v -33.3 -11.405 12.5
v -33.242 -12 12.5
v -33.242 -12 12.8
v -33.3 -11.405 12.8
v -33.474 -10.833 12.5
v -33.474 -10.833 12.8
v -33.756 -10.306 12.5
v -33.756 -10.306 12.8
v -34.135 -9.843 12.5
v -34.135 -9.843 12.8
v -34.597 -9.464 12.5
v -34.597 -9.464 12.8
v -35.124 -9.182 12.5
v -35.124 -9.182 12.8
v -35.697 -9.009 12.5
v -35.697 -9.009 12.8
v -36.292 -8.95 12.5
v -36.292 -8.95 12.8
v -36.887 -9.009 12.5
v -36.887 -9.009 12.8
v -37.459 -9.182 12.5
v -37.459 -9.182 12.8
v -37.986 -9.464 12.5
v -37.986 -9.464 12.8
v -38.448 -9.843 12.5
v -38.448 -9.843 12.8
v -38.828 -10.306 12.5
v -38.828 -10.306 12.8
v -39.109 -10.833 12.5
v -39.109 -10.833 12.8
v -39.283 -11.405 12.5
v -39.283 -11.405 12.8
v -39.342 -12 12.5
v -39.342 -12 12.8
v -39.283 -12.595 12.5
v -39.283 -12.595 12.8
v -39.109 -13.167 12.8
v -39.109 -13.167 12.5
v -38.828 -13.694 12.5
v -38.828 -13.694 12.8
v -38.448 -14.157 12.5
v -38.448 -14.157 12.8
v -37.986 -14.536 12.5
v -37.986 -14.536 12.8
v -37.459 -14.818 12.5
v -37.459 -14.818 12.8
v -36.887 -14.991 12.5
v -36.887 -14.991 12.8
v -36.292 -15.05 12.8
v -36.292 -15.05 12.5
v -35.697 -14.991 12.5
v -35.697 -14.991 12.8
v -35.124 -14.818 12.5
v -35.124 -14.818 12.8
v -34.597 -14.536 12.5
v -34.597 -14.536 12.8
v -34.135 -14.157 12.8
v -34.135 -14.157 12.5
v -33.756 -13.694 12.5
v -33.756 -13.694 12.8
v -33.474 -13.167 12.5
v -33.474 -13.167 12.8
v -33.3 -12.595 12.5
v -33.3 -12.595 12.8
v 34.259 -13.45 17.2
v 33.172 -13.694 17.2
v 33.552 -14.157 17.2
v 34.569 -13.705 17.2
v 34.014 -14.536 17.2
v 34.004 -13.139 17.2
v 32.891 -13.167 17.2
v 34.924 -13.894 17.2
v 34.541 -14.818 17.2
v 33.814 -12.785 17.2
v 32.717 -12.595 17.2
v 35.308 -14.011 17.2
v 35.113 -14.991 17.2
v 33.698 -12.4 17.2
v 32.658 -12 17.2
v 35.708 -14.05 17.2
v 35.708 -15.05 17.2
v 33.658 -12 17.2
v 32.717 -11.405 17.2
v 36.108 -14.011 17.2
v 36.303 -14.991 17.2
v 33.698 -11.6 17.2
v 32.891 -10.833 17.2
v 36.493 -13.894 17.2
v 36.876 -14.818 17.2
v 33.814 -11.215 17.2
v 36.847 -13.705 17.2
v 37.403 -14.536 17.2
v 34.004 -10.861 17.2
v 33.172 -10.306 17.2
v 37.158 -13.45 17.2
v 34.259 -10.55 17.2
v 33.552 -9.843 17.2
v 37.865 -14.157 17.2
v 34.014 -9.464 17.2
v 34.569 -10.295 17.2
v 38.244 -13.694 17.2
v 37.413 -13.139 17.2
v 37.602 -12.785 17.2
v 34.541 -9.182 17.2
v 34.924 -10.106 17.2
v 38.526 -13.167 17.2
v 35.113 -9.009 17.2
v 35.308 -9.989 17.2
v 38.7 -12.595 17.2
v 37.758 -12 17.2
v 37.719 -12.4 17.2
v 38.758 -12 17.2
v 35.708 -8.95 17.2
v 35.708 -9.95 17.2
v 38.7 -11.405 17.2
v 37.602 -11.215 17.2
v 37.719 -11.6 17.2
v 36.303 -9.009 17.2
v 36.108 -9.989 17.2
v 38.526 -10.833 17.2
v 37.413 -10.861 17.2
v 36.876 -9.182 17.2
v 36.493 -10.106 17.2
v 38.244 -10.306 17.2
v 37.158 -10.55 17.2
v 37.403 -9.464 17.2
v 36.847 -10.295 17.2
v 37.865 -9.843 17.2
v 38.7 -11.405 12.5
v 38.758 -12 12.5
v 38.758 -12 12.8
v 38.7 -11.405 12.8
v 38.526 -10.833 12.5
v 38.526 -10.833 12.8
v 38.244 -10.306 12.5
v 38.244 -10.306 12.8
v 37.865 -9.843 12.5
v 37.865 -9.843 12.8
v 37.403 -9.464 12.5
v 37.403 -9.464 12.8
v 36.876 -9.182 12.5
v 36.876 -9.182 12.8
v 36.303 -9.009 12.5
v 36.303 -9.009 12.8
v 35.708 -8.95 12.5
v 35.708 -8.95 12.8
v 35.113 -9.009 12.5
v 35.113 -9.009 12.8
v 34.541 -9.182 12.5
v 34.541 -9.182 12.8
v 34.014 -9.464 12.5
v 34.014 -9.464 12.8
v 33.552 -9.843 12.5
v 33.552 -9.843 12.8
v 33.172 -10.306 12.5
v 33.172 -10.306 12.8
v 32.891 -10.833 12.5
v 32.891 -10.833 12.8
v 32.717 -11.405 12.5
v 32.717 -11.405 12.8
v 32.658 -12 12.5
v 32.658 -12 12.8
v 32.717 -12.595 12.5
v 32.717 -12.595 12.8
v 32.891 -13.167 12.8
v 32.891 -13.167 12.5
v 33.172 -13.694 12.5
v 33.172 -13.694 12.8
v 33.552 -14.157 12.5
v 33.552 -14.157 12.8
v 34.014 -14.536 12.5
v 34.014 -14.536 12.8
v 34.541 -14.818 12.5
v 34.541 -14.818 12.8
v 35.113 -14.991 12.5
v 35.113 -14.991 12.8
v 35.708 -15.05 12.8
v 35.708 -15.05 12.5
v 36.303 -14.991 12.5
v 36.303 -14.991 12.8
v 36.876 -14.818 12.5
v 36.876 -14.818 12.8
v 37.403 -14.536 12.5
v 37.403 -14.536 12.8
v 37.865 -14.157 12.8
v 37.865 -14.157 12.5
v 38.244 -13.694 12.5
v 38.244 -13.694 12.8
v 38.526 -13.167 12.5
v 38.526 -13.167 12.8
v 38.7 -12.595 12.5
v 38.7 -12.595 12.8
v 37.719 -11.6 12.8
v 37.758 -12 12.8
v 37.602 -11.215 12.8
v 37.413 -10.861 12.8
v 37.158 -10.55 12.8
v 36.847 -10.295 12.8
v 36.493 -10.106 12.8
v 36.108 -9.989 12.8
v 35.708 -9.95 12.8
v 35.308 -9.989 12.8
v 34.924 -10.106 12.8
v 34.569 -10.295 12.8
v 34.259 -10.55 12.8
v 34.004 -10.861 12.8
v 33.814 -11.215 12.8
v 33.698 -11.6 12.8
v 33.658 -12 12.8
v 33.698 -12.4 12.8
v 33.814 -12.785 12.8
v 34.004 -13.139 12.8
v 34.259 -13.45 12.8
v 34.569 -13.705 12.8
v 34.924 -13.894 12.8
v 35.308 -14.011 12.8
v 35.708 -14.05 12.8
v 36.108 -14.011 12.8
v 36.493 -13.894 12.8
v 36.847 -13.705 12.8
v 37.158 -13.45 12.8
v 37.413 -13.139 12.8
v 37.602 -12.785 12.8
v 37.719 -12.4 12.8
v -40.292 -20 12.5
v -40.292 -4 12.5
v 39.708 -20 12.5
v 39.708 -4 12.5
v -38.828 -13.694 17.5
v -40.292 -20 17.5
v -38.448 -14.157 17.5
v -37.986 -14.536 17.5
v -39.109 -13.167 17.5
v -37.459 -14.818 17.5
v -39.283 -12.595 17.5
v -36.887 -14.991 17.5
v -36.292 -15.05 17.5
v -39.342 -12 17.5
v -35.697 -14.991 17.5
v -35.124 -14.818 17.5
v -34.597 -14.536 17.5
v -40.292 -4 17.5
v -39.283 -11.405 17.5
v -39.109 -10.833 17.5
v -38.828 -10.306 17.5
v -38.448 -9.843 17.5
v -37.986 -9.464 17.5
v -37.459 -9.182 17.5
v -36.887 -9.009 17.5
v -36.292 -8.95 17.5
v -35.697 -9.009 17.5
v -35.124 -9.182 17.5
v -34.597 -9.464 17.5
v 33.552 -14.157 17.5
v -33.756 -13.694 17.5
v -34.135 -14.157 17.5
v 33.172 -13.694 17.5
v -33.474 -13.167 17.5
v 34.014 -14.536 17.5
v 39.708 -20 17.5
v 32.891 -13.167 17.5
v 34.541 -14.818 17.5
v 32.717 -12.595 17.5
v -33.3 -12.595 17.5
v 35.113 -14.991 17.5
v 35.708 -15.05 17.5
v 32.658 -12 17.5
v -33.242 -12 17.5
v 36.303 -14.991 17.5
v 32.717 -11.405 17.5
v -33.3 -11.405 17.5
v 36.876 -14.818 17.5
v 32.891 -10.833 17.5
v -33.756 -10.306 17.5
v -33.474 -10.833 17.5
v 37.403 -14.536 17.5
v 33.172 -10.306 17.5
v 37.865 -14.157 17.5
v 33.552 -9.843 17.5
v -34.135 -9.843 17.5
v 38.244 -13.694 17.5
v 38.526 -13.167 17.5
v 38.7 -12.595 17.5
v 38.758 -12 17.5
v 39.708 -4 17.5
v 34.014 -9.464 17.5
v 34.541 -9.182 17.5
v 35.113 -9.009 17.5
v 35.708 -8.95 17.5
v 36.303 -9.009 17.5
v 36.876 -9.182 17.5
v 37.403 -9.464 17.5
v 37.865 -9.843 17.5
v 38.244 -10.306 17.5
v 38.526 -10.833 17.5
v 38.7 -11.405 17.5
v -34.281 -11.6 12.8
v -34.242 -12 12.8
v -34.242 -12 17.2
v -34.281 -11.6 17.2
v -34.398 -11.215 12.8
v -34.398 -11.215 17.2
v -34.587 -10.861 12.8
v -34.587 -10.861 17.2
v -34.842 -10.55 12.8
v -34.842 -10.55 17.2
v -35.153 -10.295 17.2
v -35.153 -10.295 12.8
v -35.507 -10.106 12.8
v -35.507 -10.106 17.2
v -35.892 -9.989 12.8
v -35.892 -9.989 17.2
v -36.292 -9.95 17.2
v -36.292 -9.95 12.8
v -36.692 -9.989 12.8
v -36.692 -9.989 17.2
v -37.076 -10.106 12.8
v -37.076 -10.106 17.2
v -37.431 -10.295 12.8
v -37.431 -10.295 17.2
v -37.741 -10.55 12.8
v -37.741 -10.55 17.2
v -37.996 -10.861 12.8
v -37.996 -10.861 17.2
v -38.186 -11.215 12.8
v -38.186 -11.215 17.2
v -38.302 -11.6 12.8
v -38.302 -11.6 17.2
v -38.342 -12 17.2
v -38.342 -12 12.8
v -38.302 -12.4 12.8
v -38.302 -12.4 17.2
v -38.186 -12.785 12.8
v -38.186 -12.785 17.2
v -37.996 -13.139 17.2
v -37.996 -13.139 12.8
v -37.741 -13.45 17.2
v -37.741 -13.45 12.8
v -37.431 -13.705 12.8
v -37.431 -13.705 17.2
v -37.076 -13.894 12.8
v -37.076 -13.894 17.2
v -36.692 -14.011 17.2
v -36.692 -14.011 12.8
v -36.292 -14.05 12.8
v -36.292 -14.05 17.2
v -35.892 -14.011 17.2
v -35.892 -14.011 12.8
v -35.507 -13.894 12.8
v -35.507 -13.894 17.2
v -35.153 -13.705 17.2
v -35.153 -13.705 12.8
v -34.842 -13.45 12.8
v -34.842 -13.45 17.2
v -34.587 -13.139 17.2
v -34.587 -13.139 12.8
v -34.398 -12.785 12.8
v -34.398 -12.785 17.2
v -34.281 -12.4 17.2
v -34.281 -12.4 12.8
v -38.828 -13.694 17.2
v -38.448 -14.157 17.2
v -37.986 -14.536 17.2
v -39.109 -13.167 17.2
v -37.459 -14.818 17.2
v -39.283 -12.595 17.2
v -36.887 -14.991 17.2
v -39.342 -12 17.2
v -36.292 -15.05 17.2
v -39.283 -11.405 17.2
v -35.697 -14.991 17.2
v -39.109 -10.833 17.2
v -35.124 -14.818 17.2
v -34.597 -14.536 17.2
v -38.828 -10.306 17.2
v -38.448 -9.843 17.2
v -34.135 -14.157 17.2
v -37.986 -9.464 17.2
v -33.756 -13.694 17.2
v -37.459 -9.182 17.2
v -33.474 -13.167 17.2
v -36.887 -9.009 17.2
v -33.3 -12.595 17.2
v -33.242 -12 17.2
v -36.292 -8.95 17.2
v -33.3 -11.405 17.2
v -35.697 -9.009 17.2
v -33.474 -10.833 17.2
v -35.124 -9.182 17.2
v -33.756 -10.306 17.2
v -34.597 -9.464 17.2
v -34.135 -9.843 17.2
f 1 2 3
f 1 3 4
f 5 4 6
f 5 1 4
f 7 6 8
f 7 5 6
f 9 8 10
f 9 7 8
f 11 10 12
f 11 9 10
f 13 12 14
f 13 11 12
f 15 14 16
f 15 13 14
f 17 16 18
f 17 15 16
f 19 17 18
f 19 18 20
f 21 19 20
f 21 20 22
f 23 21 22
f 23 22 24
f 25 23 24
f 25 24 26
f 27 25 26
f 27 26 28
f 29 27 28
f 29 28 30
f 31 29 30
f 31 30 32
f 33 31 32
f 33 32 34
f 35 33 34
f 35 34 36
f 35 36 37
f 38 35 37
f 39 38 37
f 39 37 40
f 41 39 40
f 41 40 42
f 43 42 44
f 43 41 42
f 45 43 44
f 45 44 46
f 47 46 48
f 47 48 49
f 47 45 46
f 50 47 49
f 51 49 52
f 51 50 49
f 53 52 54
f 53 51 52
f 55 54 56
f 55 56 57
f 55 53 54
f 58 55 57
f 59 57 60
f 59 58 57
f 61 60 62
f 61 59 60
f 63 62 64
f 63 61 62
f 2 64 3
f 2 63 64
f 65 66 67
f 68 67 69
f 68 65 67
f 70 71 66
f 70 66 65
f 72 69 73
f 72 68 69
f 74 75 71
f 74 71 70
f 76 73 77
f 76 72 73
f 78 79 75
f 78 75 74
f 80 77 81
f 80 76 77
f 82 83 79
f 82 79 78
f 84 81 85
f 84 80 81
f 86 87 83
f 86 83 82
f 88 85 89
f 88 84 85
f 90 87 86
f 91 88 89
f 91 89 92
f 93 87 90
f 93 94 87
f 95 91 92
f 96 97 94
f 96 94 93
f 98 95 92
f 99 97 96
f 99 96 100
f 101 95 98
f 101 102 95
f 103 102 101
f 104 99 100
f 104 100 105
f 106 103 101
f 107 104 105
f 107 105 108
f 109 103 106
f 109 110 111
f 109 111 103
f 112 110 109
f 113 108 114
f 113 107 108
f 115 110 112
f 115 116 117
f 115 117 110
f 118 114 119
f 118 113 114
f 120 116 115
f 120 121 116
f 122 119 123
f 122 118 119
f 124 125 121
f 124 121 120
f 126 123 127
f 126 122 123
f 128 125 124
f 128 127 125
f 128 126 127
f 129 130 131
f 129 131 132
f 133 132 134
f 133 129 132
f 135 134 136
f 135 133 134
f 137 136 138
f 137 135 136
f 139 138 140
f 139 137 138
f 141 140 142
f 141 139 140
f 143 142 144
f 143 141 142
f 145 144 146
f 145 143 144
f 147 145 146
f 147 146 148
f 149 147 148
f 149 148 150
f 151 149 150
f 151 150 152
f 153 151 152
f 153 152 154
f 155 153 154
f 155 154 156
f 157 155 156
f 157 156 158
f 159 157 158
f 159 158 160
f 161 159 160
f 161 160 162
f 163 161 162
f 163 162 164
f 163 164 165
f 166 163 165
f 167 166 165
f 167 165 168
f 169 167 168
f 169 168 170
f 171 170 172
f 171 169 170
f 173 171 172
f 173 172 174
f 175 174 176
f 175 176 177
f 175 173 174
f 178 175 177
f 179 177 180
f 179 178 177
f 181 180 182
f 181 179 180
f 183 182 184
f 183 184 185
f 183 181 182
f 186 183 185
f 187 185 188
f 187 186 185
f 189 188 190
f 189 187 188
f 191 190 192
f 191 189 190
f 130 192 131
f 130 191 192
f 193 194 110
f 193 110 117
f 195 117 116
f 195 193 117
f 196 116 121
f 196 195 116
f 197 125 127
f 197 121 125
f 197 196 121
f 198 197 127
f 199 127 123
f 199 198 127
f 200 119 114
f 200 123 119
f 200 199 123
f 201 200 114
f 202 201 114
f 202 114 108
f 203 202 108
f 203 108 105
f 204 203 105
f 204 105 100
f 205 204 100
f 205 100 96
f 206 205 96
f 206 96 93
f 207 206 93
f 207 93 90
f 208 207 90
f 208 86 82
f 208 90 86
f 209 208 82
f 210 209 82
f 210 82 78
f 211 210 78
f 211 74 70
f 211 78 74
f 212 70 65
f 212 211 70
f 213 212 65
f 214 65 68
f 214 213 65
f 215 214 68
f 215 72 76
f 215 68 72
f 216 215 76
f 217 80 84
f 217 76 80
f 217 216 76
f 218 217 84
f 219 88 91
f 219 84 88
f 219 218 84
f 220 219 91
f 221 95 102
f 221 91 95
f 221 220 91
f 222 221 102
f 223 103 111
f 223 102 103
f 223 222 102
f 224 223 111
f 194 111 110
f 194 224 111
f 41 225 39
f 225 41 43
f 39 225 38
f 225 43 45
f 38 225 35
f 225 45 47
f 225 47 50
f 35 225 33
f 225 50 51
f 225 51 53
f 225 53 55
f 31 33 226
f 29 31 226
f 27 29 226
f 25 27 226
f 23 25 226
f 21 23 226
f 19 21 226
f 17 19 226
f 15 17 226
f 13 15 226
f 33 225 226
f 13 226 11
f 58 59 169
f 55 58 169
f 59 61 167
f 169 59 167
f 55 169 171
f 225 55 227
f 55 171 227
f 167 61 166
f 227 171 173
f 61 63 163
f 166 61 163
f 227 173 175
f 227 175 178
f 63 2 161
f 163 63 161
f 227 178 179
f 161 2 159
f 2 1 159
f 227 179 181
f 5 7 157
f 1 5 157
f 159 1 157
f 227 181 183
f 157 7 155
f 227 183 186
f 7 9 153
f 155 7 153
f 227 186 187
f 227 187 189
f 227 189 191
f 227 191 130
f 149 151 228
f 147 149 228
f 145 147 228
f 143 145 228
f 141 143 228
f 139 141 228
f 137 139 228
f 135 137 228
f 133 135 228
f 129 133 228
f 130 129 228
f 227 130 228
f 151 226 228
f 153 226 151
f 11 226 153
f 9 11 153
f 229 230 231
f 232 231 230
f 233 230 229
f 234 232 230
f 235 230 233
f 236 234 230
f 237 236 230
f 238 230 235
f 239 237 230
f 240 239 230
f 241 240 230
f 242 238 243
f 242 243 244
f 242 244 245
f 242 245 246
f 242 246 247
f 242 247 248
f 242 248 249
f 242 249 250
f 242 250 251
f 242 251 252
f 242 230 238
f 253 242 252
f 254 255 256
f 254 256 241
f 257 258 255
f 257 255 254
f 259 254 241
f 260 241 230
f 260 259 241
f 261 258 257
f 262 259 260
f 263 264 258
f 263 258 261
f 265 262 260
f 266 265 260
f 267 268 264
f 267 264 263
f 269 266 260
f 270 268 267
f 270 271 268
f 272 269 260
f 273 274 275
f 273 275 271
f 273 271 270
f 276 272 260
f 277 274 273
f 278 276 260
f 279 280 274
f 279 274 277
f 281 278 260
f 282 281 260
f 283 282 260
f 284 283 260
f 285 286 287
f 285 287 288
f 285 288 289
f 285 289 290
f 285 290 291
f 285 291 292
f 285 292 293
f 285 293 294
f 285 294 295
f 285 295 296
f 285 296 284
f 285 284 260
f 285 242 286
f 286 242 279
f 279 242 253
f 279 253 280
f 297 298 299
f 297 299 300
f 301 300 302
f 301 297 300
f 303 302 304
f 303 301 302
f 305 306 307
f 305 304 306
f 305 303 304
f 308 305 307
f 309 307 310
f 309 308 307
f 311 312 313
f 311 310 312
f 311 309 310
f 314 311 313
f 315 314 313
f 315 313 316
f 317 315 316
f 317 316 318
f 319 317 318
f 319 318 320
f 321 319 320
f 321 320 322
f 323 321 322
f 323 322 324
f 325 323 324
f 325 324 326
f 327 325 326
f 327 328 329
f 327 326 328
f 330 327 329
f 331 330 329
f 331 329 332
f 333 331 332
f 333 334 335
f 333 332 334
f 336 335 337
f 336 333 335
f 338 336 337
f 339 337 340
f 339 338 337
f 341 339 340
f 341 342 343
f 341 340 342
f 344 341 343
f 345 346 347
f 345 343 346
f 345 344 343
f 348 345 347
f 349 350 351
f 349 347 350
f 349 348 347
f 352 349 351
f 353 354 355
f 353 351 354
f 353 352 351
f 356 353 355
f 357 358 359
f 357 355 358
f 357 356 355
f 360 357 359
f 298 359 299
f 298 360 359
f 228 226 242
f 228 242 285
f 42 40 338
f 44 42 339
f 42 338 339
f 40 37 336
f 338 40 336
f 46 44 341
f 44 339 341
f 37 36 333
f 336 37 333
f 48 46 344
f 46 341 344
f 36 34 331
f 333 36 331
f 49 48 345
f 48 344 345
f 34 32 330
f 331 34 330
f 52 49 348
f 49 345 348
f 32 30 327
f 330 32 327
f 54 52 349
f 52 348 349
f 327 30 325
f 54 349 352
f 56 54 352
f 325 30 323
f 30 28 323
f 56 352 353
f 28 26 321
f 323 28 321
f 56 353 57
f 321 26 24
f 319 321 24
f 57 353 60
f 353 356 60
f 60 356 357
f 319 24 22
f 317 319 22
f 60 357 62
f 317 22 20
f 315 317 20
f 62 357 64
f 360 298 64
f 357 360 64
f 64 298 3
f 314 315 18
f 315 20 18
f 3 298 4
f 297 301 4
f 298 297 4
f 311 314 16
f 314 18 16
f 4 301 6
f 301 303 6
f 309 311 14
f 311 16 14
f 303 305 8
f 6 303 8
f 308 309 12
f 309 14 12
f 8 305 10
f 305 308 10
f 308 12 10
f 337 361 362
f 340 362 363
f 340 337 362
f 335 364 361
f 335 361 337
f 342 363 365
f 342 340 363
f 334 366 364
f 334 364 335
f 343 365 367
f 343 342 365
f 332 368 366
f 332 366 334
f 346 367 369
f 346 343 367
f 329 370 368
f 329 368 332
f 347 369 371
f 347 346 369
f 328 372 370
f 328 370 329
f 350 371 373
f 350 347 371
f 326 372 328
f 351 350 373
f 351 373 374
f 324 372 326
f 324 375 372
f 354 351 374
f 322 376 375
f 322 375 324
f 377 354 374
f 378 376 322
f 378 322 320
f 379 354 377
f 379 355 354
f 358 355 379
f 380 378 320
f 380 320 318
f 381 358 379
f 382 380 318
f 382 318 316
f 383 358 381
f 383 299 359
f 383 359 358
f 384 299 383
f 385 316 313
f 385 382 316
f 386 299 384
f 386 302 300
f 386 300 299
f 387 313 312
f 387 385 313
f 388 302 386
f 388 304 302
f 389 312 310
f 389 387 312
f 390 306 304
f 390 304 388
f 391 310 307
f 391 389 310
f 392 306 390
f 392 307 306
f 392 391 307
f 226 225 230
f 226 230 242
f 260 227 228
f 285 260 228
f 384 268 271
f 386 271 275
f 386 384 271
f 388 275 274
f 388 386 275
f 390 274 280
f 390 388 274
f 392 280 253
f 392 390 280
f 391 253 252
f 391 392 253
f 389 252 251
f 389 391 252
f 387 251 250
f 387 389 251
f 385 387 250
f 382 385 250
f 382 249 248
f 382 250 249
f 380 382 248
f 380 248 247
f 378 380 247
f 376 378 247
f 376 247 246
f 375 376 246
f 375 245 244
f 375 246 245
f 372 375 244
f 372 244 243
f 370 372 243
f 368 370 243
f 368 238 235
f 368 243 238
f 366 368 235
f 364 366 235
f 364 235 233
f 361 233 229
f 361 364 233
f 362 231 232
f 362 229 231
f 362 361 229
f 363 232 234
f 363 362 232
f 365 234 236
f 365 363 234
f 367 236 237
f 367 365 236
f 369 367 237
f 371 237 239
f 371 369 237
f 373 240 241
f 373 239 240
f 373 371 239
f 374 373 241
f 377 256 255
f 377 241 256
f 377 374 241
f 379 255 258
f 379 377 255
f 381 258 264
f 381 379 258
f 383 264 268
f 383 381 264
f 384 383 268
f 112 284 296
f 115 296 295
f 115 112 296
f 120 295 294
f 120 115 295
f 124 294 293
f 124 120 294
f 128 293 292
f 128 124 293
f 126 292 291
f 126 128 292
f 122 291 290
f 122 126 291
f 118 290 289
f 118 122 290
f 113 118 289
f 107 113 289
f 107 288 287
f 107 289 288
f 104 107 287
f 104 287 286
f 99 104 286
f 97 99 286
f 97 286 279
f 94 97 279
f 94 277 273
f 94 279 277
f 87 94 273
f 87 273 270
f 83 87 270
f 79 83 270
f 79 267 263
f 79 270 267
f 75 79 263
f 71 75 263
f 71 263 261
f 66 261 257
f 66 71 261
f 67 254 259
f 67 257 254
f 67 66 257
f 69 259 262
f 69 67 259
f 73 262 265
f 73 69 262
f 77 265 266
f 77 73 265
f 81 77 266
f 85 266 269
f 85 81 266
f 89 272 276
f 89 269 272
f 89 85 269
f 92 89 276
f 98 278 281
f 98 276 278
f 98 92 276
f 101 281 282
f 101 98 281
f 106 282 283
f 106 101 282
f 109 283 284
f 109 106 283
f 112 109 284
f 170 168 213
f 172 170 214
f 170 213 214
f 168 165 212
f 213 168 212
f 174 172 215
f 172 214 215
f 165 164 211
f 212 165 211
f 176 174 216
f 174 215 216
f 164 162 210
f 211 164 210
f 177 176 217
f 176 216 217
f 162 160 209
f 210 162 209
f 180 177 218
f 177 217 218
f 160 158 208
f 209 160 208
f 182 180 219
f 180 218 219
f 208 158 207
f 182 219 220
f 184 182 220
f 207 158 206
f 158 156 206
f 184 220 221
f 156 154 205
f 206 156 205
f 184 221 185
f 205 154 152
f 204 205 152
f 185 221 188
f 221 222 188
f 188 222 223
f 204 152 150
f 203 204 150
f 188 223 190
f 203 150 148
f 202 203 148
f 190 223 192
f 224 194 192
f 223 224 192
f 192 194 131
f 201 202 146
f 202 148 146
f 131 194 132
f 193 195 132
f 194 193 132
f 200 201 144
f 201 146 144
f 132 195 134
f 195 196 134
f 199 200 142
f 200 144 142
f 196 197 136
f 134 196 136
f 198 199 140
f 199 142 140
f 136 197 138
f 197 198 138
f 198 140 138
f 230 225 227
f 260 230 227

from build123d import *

# Parameters (mm, degrees)
INSTALLED_SPRING_STRIP_SKETCH_W = 80
INSTALLED_SPRING_STRIP_SKETCH_H = 16
INSTALLED_SPRING_STRIP_DEPTH    = 5
EYELET_CLEARANCE_1_SKETCH_R     = 2.05
EYELET_CLEARANCE_1_DEPTH        = 5.2
FLANGE_RECESS_1_1_SKETCH_R      = 3.05
FLANGE_RECESS_1_1_DEPTH         = 0.4
FLANGE_RECESS_1_2_SKETCH_R      = 3.05
FLANGE_RECESS_1_2_DEPTH         = 0.4
EYELET_CLEARANCE_2_SKETCH_R     = 2.05
EYELET_CLEARANCE_2_DEPTH        = 5.2
FLANGE_RECESS_2_1_SKETCH_R      = 3.05
FLANGE_RECESS_2_1_DEPTH         = 0.4
FLANGE_RECESS_2_2_SKETCH_R      = 3.05
FLANGE_RECESS_2_2_DEPTH         = 0.4


with BuildPart() as part:
    # Installed spring strip sketch → Installed spring strip (new body)
    with BuildSketch(Plane.XY.offset(12.5)):
        with Locations((-0.291651246, -12)):
            Rectangle(INSTALLED_SPRING_STRIP_SKETCH_W, INSTALLED_SPRING_STRIP_SKETCH_H)
    extrude(amount=INSTALLED_SPRING_STRIP_DEPTH)

    # Eyelet clearance 1 sketch → Eyelet clearance 1 (cut)
    with BuildSketch(Plane.XY.offset(12.4)):
        with Locations((-36.291651246, -12)):
            Circle(EYELET_CLEARANCE_1_SKETCH_R)
    extrude(amount=EYELET_CLEARANCE_1_DEPTH, mode=Mode.SUBTRACT)

    # Flange recess 1-1 sketch → Flange recess 1-1 (cut)
    with BuildSketch(Plane.XY.offset(12.4)):
        with Locations((-36.291651246, -12)):
            Circle(FLANGE_RECESS_1_1_SKETCH_R)
    extrude(amount=FLANGE_RECESS_1_1_DEPTH, mode=Mode.SUBTRACT)

    # Flange recess 1-2 sketch → Flange recess 1-2 (cut)
    with BuildSketch(Plane.XY.offset(17.2)):
        with Locations((-36.291651246, -12)):
            Circle(FLANGE_RECESS_1_2_SKETCH_R)
    extrude(amount=FLANGE_RECESS_1_2_DEPTH, mode=Mode.SUBTRACT)

    # Eyelet clearance 2 sketch → Eyelet clearance 2 (cut)
    with BuildSketch(Plane.XY.offset(12.4)):
        with Locations((35.708348754, -12)):
            Circle(EYELET_CLEARANCE_2_SKETCH_R)
    extrude(amount=EYELET_CLEARANCE_2_DEPTH, mode=Mode.SUBTRACT)

    # Flange recess 2-1 sketch → Flange recess 2-1 (cut)
    with BuildSketch(Plane.XY.offset(12.4)):
        with Locations((35.708348754, -12)):
            Circle(FLANGE_RECESS_2_1_SKETCH_R)
    extrude(amount=FLANGE_RECESS_2_1_DEPTH, mode=Mode.SUBTRACT)

    # Flange recess 2-2 sketch → Flange recess 2-2 (cut)
    with BuildSketch(Plane.XY.offset(17.2)):
        with Locations((35.708348754, -12)):
            Circle(FLANGE_RECESS_2_2_SKETCH_R)
    extrude(amount=FLANGE_RECESS_2_2_DEPTH, mode=Mode.SUBTRACT)


solid = part.part
